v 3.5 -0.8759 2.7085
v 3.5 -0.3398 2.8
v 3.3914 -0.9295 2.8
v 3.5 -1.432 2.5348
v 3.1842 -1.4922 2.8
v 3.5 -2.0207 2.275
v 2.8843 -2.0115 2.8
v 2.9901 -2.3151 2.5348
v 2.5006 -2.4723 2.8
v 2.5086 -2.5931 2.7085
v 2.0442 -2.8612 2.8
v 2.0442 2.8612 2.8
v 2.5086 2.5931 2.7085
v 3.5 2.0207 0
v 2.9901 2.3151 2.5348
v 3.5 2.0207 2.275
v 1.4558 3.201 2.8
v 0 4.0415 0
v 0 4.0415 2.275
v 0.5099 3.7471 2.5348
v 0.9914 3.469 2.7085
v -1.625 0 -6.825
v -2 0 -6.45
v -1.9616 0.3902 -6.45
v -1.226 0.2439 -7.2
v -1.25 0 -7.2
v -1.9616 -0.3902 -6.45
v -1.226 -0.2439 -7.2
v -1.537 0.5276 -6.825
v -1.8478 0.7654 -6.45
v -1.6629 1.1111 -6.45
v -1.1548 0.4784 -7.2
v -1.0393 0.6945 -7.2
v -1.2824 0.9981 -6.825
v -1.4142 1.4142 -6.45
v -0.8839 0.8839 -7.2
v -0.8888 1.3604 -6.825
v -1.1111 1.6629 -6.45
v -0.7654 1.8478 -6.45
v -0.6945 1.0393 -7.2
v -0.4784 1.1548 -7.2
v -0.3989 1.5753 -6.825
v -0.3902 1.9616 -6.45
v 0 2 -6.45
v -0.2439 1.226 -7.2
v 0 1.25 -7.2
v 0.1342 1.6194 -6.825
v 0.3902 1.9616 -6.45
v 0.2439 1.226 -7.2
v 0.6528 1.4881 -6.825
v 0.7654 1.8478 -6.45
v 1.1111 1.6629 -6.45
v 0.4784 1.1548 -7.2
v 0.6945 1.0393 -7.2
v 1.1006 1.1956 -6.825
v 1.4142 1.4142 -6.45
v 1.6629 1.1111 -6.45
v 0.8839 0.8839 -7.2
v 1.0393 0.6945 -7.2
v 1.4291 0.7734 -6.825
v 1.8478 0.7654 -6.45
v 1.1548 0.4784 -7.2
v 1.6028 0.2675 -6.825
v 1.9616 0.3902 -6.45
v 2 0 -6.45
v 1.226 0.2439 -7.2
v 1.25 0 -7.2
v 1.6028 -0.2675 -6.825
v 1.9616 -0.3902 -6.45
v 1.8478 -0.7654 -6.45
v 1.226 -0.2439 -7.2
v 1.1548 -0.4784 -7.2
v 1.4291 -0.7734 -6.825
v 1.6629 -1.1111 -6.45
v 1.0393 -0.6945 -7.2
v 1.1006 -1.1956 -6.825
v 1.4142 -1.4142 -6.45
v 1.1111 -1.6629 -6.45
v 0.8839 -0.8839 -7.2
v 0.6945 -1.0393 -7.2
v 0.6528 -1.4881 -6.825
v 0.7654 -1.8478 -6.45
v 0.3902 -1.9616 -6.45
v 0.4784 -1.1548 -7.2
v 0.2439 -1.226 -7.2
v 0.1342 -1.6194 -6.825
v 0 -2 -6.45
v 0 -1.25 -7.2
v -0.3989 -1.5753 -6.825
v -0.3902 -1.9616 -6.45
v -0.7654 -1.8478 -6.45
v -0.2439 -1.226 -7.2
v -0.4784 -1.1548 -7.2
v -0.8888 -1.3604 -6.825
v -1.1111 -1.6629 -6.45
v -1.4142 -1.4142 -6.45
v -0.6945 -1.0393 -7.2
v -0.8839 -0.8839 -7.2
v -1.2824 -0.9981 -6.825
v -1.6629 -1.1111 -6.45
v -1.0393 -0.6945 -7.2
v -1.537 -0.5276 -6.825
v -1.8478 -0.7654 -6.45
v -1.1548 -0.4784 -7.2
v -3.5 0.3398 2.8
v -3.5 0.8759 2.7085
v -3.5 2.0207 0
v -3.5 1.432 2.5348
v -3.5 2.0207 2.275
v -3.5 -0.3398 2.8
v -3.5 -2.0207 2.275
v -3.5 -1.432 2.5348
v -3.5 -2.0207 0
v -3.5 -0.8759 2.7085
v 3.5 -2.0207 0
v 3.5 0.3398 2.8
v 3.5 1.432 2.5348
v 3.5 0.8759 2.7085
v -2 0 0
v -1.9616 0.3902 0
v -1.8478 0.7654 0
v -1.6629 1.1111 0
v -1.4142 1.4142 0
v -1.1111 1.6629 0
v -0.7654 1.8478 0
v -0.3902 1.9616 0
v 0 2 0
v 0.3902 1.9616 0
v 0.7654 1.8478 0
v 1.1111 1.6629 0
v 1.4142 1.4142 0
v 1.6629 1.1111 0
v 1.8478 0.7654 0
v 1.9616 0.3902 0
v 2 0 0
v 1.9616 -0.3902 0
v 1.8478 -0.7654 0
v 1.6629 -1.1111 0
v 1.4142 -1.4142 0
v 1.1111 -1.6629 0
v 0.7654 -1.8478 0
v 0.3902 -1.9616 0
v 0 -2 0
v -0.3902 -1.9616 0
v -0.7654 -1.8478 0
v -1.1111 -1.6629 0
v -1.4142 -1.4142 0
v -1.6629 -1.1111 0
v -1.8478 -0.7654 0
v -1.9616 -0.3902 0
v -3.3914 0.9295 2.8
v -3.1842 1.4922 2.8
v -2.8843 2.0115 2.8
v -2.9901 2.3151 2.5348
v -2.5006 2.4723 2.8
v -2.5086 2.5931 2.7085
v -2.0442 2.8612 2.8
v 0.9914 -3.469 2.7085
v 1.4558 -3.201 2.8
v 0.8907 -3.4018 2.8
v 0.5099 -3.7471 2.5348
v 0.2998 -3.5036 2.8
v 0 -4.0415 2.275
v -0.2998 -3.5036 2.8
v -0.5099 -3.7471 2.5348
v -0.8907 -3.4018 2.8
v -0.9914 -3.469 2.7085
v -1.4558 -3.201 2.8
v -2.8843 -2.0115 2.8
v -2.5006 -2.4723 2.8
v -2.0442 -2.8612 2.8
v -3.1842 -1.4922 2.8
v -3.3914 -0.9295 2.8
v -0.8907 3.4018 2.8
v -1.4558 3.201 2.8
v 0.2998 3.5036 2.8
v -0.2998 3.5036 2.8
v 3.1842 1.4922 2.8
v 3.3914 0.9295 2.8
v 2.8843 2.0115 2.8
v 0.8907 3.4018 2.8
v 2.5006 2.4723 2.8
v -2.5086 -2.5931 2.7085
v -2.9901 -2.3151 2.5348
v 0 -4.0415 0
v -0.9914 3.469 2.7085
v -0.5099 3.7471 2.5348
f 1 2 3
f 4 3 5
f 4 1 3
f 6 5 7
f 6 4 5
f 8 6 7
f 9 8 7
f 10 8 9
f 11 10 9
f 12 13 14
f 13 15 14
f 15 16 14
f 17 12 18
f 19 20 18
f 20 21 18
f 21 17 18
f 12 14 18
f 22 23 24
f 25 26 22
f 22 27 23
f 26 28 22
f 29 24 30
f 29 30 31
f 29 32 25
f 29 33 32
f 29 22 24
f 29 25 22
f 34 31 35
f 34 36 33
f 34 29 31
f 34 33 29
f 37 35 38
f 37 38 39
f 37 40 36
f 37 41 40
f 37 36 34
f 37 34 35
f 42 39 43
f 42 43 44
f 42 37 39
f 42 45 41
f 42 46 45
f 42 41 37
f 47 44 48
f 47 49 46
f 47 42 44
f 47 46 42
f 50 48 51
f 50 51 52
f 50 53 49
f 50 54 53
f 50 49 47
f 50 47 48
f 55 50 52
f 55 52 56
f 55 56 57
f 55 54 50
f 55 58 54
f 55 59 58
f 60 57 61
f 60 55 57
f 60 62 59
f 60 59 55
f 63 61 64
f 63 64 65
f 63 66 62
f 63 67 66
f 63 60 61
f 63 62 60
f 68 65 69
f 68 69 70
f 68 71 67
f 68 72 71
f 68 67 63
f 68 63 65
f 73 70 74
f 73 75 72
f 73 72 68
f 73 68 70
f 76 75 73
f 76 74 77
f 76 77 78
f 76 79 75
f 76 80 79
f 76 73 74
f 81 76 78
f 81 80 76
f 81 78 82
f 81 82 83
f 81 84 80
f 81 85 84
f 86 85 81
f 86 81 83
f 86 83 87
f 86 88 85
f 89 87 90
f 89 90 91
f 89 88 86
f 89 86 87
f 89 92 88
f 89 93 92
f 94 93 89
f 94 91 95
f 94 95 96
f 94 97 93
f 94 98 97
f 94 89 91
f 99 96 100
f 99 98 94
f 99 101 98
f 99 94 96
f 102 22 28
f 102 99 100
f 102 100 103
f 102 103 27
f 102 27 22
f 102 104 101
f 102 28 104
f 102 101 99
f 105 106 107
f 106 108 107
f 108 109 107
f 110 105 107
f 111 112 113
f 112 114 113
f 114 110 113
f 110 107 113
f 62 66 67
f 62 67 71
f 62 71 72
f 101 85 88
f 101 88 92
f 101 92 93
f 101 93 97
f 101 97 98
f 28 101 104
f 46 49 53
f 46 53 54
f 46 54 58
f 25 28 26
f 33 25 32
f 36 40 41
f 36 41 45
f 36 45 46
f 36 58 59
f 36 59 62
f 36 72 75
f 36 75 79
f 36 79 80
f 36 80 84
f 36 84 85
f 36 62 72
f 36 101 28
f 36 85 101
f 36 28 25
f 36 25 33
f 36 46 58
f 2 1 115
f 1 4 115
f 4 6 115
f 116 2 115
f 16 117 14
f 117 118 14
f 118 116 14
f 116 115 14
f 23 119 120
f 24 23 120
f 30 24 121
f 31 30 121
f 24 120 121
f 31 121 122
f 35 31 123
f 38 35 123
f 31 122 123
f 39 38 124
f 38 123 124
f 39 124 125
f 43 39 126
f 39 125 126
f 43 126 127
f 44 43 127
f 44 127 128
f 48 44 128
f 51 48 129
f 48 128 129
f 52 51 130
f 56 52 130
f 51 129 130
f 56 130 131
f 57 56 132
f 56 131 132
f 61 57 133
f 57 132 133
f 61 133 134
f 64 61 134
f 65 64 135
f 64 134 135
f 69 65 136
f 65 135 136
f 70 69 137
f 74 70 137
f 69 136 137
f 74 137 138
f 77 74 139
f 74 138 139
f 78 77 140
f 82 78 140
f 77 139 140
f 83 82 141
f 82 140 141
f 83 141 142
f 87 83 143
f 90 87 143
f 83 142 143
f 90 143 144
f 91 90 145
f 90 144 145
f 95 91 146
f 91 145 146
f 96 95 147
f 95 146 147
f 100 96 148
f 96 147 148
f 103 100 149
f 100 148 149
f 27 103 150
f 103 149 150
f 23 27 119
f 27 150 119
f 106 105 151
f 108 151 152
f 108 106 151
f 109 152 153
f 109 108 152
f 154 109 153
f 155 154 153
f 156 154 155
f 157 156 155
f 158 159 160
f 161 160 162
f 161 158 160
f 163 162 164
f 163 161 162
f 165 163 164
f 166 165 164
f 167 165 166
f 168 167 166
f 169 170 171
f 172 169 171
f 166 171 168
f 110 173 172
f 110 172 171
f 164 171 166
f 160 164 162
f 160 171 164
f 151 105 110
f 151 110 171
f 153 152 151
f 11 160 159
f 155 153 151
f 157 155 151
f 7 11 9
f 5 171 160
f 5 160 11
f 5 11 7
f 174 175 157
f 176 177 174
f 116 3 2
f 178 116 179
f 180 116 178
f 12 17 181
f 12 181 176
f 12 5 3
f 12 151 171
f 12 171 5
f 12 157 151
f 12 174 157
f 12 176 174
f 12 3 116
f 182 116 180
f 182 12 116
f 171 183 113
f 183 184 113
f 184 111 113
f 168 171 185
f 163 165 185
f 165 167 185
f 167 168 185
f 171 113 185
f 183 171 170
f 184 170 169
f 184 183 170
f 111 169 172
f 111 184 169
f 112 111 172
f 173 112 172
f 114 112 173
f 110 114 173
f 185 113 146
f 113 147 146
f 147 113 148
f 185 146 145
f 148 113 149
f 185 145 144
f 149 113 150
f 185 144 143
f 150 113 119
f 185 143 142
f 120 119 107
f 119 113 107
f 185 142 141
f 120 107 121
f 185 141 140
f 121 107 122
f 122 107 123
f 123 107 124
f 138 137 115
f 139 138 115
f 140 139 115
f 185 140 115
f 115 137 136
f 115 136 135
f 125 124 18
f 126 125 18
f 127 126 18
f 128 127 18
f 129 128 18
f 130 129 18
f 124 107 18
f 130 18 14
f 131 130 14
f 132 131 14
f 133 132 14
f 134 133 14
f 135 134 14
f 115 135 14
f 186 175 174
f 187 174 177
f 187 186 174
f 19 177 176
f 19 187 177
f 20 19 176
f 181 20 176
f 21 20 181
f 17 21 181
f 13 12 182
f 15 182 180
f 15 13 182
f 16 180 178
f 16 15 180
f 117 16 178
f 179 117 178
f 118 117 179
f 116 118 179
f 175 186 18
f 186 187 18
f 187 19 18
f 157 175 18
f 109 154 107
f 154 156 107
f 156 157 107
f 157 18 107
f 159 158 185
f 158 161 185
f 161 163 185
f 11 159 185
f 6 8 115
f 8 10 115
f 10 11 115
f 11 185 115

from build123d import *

# Parameters (mm, degrees)
EXTRUDE_1_DEPTH = 2.8
SKETCH_2_R      = 2
EXTRUDE_2_DEPTH = 7.2
CHAMFER_1_SIZE  = 0.75


with BuildPart() as part:
    # Эскиз1 → Вытянуть1 (new body)
    with BuildSketch(Plane.XY):
        Polygon((0, 4.041451884), (-3.5, 2.020725942), (-3.5, -2.020725942), (0, -4.041451884), (3.5, -2.020725942), (3.5, 2.020725942), align=None)
    extrude(amount=EXTRUDE_1_DEPTH)

    # Эскиз2 → Вытянуть2 (add)
    with BuildSketch(Plane(origin=(0, 0, 0), x_dir=(-1, 0, 0), z_dir=(0, 0, -1))):
        Circle(SKETCH_2_R)
    extrude(amount=EXTRUDE_2_DEPTH)

    # Эскиз15 → Вырез-Повернуть1 (revolve, cut)
    with BuildSketch(Plane(origin=(0, 0, 0), x_dir=(0, 0, -1), z_dir=(1, 0, 0))):
        Polygon((-2.8, 4.041451884), (-2.8, 3.516451884), (-2.275, 4.041451884), align=None)
    revolve(axis=Axis((0, 0, 5.265296569), (0, 0, -1)), mode=Mode.SUBTRACT)

    # Фаска1
    chamfer_1_edges = [part.edges().sort_by_distance(p)[0] for p in [
        (2, 0, -7.2),
    ]]
    chamfer(chamfer_1_edges, length=CHAMFER_1_SIZE)


solid = part.part
